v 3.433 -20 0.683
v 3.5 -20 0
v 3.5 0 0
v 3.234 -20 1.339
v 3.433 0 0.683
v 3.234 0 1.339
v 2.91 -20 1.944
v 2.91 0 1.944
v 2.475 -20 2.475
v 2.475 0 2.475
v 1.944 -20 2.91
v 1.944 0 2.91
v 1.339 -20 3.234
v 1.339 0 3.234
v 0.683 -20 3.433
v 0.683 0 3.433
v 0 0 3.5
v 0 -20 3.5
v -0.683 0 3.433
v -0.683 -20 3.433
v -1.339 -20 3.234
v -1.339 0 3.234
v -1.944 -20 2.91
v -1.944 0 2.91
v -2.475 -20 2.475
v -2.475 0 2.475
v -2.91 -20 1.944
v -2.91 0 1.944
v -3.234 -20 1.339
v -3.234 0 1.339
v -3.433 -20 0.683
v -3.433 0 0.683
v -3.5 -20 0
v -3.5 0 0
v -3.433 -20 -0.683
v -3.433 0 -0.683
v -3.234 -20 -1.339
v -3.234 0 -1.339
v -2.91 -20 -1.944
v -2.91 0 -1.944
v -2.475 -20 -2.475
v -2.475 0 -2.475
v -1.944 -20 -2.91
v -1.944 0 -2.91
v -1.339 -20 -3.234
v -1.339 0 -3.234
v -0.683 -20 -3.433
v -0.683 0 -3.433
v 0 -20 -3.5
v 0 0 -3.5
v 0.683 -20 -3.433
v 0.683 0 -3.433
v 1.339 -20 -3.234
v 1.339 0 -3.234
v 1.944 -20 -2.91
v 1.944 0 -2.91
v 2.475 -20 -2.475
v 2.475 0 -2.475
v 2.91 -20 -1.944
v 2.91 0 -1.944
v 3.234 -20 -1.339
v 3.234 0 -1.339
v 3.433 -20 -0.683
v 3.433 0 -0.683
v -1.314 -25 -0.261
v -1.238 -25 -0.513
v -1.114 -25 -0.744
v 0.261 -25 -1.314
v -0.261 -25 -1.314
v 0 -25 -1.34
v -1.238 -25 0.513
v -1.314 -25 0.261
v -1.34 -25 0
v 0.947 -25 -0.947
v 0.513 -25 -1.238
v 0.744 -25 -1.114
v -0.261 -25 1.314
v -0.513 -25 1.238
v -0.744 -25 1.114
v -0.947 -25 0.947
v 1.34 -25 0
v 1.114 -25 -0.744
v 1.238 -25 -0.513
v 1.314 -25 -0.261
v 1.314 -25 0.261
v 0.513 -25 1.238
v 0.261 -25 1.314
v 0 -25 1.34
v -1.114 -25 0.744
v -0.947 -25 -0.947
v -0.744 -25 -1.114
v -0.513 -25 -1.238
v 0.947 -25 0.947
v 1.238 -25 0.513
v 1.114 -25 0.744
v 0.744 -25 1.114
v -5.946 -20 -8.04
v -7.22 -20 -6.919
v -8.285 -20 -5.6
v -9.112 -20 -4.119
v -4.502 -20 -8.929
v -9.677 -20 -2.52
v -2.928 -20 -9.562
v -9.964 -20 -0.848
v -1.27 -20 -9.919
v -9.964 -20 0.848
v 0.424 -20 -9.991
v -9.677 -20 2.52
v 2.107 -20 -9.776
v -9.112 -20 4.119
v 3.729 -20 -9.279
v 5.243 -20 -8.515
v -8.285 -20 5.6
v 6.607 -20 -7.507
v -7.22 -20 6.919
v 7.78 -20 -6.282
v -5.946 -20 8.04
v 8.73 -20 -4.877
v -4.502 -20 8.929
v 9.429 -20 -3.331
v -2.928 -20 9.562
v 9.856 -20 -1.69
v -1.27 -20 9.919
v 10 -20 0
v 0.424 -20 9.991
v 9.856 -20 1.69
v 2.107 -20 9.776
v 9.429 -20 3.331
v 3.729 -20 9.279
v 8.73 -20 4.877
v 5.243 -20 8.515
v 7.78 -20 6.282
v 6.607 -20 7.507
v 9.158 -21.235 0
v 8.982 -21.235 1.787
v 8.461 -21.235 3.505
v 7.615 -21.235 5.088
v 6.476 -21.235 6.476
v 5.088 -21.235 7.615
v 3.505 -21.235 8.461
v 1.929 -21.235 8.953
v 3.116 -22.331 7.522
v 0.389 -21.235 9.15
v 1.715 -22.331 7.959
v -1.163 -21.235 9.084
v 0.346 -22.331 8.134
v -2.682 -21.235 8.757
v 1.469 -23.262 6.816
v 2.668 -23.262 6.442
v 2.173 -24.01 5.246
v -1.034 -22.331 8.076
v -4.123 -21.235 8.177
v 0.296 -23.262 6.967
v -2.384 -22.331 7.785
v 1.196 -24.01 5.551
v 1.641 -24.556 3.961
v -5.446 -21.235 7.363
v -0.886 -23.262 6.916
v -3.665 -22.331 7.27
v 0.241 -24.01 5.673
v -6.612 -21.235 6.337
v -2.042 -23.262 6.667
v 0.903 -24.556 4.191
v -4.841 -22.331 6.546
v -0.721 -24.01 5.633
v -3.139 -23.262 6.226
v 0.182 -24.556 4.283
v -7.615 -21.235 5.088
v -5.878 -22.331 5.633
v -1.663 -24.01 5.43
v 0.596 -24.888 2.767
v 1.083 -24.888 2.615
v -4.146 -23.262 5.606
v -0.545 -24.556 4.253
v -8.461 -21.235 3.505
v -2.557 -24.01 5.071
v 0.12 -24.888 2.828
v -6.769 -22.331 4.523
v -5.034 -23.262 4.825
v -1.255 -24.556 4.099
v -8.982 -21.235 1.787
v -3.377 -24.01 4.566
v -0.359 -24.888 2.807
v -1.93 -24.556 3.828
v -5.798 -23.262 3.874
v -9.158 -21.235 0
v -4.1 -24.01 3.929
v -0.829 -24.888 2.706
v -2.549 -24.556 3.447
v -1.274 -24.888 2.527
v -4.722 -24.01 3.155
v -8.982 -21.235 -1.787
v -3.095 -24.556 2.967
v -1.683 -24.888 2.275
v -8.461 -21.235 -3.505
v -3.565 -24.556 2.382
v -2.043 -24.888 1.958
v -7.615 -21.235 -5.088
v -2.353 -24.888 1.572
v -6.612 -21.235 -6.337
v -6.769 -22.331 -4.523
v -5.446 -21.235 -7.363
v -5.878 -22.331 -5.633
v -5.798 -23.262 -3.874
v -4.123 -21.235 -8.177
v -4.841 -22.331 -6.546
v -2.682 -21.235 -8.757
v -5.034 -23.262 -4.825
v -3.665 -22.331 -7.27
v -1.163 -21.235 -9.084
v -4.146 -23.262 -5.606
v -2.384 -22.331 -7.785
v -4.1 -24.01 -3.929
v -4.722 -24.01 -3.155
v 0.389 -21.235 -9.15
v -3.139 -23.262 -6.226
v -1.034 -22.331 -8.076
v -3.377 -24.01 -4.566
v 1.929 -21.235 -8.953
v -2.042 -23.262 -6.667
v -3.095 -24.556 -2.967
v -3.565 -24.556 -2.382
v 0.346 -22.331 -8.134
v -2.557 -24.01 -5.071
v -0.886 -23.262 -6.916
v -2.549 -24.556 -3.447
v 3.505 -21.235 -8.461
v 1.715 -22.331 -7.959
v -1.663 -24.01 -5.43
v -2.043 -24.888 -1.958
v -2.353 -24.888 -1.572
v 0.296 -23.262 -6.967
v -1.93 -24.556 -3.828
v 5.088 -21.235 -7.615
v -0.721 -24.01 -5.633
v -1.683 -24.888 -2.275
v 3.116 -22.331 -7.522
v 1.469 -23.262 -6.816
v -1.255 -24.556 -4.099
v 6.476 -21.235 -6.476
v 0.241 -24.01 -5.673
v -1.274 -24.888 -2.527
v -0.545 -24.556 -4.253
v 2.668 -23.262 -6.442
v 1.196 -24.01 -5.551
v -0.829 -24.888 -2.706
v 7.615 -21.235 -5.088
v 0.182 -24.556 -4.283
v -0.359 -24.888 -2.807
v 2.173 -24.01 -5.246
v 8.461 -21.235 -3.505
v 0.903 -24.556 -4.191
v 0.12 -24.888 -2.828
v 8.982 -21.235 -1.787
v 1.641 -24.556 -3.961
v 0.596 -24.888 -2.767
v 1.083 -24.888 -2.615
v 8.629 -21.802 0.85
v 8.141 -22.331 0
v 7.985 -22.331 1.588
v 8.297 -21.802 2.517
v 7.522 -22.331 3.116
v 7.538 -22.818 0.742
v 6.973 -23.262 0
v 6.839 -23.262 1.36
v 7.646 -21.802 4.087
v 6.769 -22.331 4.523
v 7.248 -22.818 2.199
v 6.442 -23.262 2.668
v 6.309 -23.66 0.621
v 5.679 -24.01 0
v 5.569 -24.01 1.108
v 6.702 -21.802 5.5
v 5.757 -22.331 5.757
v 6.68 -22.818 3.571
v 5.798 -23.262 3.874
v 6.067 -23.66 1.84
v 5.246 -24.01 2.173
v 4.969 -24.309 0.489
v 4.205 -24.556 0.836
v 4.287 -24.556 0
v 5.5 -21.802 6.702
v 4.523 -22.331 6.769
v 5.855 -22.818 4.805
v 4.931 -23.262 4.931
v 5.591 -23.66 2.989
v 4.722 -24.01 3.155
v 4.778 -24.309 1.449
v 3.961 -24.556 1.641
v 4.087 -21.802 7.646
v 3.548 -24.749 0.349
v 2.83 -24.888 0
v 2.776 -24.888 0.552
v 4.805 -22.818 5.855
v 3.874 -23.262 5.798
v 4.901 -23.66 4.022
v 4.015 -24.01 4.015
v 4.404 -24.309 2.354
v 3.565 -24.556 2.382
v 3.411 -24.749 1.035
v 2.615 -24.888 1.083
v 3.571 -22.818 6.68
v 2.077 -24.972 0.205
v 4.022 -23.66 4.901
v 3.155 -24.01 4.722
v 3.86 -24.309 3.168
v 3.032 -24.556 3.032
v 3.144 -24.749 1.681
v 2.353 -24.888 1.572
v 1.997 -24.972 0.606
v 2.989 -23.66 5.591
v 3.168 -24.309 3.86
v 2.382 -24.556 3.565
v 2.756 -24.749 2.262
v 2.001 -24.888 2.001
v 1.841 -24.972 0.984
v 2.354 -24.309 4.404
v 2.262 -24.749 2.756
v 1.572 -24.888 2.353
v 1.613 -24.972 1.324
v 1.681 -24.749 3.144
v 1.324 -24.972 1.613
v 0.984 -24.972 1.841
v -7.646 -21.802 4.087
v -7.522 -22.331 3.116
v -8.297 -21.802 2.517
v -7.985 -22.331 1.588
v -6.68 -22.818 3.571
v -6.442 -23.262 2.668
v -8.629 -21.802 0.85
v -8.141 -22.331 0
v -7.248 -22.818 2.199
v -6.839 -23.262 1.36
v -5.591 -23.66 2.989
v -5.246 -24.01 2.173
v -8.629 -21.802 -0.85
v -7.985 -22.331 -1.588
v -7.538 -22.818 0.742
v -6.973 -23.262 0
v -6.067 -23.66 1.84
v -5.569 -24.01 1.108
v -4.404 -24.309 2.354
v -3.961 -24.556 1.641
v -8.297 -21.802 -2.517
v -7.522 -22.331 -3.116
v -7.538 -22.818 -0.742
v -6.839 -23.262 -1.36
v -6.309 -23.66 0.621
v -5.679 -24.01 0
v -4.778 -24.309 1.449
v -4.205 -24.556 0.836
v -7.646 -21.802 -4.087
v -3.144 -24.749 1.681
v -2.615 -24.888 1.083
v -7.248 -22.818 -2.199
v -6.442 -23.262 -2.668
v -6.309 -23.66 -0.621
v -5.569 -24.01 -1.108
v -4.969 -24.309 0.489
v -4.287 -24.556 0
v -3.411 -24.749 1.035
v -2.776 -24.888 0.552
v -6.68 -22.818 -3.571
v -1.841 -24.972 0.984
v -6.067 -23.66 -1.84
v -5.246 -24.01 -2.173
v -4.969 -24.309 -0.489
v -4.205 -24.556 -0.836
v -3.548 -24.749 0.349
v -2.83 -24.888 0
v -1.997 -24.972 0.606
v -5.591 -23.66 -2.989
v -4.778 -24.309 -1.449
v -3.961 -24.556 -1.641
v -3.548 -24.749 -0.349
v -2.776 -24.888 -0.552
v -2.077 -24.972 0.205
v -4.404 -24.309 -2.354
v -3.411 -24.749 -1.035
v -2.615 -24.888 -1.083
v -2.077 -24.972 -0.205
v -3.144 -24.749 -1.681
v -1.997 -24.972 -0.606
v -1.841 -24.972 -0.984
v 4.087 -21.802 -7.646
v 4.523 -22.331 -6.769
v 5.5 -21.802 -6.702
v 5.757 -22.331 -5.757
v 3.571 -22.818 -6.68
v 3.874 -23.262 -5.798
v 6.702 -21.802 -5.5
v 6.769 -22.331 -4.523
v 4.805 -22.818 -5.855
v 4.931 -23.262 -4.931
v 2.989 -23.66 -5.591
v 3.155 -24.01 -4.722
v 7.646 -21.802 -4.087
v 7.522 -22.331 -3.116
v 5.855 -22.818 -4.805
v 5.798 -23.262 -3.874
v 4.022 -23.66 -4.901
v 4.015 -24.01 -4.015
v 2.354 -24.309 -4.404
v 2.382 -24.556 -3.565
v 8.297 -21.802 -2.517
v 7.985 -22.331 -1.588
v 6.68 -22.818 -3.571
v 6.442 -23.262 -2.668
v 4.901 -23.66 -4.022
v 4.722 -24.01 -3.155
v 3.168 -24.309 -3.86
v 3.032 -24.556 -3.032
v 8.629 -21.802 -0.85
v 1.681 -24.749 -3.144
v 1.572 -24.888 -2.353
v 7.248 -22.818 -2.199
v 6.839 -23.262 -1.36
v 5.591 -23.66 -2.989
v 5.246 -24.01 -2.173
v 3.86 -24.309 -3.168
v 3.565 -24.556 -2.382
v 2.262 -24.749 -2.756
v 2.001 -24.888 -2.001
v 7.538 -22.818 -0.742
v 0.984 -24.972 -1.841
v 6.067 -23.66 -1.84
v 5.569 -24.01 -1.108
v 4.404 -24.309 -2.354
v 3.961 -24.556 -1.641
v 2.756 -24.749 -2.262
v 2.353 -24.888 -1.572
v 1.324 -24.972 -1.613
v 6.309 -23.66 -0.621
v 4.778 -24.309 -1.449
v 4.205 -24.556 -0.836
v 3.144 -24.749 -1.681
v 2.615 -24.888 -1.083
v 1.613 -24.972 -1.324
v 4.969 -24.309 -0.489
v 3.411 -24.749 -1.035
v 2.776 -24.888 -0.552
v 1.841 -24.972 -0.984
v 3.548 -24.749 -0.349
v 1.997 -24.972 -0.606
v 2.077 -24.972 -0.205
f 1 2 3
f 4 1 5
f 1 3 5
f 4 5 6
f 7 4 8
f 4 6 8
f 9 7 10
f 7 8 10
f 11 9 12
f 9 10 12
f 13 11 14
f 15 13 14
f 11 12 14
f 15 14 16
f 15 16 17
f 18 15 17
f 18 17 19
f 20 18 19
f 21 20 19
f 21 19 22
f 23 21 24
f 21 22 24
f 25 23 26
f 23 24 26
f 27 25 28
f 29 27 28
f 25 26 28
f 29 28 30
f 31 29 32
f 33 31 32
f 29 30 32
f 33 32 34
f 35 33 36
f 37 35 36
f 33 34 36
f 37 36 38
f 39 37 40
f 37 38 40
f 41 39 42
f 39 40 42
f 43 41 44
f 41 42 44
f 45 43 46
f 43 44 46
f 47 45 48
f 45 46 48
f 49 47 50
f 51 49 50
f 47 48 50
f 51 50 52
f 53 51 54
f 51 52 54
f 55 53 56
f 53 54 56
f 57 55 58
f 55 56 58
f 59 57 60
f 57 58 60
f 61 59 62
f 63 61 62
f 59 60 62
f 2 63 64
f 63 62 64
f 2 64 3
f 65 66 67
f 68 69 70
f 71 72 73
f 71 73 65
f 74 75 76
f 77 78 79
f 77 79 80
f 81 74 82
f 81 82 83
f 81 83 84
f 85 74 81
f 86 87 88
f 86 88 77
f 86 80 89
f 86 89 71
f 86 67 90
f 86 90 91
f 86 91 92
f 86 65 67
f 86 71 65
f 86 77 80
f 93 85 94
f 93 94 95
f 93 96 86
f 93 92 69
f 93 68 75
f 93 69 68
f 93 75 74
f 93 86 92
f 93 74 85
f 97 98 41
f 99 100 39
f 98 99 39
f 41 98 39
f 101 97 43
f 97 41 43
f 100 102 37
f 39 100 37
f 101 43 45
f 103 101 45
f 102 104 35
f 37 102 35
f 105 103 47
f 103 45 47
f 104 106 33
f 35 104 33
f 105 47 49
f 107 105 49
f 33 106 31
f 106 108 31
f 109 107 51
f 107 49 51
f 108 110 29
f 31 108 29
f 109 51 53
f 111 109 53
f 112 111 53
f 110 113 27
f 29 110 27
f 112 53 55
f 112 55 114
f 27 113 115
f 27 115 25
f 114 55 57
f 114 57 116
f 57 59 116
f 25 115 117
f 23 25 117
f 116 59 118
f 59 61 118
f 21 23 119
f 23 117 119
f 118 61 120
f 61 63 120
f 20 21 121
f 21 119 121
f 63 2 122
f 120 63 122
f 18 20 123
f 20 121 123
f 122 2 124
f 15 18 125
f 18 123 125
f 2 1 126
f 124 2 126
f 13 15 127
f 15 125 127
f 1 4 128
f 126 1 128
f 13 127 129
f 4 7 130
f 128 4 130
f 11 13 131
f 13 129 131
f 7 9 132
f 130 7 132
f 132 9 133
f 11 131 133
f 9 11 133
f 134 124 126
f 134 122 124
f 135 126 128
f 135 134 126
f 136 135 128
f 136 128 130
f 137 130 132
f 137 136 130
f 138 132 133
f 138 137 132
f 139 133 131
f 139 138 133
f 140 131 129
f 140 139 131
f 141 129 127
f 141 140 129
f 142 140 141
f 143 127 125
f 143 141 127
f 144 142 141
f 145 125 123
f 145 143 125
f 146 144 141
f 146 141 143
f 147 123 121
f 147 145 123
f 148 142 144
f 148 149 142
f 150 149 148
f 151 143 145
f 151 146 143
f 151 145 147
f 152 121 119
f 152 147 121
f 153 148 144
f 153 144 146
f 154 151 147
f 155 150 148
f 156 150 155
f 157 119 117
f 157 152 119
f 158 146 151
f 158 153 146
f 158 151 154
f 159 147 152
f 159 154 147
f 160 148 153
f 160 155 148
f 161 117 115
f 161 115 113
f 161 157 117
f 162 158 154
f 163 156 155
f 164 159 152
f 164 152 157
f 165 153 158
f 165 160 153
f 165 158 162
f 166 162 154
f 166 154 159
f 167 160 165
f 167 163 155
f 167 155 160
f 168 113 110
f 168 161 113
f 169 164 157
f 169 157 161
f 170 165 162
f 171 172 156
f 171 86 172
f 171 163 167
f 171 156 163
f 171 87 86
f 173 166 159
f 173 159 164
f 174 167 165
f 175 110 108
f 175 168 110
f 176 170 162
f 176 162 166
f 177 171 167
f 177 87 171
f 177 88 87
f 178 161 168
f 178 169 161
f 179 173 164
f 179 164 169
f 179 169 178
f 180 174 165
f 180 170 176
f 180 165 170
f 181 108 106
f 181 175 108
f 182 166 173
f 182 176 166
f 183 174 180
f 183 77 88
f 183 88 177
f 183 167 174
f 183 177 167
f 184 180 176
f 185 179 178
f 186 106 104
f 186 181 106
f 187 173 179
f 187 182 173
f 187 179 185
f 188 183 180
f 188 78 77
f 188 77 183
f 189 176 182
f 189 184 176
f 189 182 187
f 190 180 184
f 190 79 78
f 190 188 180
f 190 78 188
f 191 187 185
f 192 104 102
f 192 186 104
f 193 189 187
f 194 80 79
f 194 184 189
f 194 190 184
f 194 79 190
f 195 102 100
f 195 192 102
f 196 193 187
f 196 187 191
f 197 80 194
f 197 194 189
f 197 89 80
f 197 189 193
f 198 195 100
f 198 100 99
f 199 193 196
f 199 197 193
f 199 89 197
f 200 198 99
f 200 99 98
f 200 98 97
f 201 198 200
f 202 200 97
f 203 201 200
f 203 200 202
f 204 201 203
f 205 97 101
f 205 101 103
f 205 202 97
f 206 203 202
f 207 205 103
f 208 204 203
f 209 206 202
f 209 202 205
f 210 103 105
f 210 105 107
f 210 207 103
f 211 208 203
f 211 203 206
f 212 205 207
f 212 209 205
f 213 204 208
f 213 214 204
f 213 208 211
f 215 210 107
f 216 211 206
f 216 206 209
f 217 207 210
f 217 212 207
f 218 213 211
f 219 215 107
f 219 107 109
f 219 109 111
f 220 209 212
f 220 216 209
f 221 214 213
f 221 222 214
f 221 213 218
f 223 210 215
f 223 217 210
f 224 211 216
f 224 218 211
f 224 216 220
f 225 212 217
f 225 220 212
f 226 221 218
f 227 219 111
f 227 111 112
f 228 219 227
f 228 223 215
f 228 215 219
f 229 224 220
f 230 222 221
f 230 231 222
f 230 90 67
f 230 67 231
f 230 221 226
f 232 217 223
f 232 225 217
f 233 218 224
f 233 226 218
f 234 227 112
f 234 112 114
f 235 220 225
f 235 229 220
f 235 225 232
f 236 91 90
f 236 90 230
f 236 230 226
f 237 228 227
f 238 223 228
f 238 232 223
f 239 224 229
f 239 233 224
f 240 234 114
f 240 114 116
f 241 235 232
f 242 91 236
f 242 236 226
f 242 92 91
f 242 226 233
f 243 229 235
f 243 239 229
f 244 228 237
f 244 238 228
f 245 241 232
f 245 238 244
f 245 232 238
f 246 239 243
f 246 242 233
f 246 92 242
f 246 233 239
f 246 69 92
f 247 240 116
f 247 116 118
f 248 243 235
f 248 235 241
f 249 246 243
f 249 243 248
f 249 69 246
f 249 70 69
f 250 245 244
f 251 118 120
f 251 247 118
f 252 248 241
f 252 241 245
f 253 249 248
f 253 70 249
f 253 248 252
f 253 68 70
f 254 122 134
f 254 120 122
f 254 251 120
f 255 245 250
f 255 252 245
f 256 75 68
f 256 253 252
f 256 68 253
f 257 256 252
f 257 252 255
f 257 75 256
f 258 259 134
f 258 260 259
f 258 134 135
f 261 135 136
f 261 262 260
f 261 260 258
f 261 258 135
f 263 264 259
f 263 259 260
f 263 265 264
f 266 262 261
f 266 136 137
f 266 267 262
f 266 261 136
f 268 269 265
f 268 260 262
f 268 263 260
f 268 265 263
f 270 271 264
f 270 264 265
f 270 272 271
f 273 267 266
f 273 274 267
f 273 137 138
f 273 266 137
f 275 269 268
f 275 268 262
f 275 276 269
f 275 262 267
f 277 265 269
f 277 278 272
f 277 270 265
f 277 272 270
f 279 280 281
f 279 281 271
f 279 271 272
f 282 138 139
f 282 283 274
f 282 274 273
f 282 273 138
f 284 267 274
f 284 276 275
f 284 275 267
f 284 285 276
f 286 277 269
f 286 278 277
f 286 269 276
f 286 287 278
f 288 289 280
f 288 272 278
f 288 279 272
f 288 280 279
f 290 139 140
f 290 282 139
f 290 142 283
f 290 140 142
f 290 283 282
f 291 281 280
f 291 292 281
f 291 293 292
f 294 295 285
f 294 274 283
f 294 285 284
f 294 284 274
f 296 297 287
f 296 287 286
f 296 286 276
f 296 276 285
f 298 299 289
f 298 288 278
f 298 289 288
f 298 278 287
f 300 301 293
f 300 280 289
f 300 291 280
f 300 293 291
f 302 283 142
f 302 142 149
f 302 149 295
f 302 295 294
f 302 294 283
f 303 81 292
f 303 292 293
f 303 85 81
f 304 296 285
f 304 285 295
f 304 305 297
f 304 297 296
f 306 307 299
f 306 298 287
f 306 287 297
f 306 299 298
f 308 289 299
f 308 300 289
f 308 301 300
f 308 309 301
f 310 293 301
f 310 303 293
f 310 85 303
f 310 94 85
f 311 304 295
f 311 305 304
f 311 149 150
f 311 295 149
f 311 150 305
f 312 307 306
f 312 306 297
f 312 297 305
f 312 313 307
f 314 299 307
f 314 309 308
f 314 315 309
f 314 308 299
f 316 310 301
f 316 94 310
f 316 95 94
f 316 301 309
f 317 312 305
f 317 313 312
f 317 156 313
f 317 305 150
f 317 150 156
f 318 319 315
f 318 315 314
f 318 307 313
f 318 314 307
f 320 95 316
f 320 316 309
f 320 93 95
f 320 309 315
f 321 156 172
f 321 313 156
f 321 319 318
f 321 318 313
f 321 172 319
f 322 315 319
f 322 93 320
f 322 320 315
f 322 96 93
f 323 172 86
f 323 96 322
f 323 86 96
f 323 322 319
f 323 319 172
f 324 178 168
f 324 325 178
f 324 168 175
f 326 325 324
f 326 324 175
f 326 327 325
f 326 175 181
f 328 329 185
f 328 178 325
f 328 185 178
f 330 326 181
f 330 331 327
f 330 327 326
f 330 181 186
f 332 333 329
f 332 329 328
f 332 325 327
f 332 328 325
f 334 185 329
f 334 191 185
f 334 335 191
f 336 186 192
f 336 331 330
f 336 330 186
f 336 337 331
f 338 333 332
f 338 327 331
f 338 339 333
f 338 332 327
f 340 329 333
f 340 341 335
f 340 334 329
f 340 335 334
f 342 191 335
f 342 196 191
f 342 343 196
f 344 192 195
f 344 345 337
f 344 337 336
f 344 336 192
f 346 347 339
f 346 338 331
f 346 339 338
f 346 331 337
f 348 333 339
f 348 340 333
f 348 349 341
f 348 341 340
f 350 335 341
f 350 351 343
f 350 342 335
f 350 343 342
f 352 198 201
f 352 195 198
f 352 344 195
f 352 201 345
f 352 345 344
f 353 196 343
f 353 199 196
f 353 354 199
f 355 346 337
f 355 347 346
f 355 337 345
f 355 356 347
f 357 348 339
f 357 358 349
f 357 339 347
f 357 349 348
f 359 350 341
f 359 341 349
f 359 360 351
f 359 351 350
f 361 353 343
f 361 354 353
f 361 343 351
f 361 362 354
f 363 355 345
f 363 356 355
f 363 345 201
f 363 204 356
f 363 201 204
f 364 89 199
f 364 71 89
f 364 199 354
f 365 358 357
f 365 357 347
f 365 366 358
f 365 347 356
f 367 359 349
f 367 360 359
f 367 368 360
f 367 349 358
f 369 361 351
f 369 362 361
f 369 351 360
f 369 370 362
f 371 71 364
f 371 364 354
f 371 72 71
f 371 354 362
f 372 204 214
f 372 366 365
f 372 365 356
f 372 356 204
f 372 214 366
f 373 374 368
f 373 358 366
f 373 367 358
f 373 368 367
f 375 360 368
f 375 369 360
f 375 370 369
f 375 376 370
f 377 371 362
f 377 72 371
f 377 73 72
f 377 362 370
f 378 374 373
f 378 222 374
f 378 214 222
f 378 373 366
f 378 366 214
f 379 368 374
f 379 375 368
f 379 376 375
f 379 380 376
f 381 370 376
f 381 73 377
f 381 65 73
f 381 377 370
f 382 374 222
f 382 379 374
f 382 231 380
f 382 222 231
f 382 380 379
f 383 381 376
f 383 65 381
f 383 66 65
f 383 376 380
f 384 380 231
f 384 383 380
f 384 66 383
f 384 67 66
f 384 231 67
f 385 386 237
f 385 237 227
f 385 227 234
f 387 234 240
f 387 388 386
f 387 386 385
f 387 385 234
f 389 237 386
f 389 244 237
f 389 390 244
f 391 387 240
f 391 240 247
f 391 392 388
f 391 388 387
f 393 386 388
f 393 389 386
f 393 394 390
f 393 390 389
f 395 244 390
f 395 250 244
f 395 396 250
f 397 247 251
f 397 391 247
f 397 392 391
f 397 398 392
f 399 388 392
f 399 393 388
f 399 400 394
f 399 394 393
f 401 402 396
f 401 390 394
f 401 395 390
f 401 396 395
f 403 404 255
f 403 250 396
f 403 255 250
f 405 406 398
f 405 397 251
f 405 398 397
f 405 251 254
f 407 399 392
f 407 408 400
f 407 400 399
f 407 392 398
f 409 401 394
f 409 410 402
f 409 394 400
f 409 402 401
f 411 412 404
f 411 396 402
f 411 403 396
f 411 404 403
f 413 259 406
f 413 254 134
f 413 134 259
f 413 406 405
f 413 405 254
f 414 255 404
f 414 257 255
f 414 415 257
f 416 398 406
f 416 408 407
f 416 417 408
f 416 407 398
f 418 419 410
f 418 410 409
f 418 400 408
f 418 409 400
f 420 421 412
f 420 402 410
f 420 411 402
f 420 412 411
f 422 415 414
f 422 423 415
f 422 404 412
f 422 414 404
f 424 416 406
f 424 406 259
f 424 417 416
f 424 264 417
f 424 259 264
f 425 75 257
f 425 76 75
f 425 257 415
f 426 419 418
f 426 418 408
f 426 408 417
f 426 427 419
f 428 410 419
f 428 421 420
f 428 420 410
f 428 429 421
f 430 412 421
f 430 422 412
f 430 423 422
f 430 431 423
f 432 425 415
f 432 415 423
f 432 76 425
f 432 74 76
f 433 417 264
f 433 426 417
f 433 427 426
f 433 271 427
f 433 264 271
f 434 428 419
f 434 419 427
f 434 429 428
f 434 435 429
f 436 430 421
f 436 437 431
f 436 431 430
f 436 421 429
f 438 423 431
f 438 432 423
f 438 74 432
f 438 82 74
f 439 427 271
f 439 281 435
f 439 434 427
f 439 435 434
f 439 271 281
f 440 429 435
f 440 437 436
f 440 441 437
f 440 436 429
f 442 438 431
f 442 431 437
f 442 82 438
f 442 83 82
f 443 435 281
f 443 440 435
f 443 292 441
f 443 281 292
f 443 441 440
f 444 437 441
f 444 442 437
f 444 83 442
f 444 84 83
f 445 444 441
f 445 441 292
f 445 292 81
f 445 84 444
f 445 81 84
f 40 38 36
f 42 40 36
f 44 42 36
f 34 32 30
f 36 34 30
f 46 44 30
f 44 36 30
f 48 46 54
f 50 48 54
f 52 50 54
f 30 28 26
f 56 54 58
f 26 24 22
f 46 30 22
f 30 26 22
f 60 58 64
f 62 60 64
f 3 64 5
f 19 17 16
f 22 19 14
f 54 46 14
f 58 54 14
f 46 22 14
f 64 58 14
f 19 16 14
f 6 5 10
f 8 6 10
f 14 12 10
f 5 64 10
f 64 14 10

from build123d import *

# Parameters (mm, degrees)
F0_R     = 3.5
F1_DEPTH = 20
F2_R     = 10
F2_R_2   = 3.5
F3_DEPTH = 5


# Not quite as in the source:
# - a fillet or chamfer that OpenCascade refuses, or shapes differently, is made with other operations: its cross-section is extruded or revolved along the edge and cut away or added


with BuildPart() as f1:
    # F0 (on Front) → F1 (new body)
    with BuildSketch(Plane.XZ):
        Circle(F0_R)
    extrude(amount=F1_DEPTH)

    # F2 (on face) → F3 (join)
    with BuildSketch(Plane.XZ.offset(20)):
        Circle(F2_R)
        Circle(F2_R_2, mode=Mode.SUBTRACT)
        Circle(F2_R_2)
    extrude(amount=F3_DEPTH)

    # F4: fillet of radius 10 on 1 edges, made by hand

    # F4_s1 → F4_t2 (revolve, cut)
    with BuildSketch(Plane.XY):
        with BuildLine():
            ThreePointArc((10, -20), (6.3397459622, -23.6602540378), (1.3397459622, -25))
            Line((1.3397459622, -25), (10, -25))
            Line((10, -25), (10, -20))
        make_face()
    revolve(axis=Axis((0, -25, 0), (0, -1, 0)), mode=Mode.SUBTRACT)


solid = f1.part
